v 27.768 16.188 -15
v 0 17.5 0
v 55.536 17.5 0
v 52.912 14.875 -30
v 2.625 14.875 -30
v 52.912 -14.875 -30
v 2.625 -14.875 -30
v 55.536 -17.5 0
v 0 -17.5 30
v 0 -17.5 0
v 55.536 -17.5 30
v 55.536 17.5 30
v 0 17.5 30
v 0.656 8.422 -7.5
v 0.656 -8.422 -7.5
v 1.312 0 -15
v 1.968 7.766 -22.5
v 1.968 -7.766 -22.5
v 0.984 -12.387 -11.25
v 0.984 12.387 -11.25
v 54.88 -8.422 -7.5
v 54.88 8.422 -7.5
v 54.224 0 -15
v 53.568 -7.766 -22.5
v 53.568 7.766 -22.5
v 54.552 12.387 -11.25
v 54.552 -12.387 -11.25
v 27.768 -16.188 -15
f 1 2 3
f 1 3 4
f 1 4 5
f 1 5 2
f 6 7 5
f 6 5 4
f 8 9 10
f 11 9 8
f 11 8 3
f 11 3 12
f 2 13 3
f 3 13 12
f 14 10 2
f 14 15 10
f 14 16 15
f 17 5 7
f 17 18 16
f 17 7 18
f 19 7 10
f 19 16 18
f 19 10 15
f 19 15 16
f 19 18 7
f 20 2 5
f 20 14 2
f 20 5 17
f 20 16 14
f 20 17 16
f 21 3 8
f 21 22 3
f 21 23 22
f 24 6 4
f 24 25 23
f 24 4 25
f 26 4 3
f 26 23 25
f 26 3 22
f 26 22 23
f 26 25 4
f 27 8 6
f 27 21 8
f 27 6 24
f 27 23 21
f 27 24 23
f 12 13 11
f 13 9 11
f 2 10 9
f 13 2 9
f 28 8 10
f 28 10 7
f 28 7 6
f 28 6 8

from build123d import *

# Parameters (mm, degrees)
F0_W      = 55.5363558233
F0_H      = 30
F1_DEPTH  = 17.5
F1_FACE_W = 55.5363558233
F1_FACE_H = 35
F2_DEPTH  = 30
F2_TAPER  = 5


with BuildPart() as f1:
    # F0 (on Front) → F1 (new body, symmetric)
    with BuildSketch(Plane.XZ):
        with Locations((27.7681779116, 15)):
            Rectangle(F0_W, F0_H)
    extrude(amount=F1_DEPTH, both=True)

    # F1_face (on face) → F2 (join)
    with BuildSketch(Plane(origin=(27.7681779116, 0, 0), x_dir=(1, 0, 0), z_dir=(0, 0, -1))):
        Rectangle(F1_FACE_W, F1_FACE_H)
    extrude(amount=F2_DEPTH, taper=F2_TAPER)


solid = f1.part
